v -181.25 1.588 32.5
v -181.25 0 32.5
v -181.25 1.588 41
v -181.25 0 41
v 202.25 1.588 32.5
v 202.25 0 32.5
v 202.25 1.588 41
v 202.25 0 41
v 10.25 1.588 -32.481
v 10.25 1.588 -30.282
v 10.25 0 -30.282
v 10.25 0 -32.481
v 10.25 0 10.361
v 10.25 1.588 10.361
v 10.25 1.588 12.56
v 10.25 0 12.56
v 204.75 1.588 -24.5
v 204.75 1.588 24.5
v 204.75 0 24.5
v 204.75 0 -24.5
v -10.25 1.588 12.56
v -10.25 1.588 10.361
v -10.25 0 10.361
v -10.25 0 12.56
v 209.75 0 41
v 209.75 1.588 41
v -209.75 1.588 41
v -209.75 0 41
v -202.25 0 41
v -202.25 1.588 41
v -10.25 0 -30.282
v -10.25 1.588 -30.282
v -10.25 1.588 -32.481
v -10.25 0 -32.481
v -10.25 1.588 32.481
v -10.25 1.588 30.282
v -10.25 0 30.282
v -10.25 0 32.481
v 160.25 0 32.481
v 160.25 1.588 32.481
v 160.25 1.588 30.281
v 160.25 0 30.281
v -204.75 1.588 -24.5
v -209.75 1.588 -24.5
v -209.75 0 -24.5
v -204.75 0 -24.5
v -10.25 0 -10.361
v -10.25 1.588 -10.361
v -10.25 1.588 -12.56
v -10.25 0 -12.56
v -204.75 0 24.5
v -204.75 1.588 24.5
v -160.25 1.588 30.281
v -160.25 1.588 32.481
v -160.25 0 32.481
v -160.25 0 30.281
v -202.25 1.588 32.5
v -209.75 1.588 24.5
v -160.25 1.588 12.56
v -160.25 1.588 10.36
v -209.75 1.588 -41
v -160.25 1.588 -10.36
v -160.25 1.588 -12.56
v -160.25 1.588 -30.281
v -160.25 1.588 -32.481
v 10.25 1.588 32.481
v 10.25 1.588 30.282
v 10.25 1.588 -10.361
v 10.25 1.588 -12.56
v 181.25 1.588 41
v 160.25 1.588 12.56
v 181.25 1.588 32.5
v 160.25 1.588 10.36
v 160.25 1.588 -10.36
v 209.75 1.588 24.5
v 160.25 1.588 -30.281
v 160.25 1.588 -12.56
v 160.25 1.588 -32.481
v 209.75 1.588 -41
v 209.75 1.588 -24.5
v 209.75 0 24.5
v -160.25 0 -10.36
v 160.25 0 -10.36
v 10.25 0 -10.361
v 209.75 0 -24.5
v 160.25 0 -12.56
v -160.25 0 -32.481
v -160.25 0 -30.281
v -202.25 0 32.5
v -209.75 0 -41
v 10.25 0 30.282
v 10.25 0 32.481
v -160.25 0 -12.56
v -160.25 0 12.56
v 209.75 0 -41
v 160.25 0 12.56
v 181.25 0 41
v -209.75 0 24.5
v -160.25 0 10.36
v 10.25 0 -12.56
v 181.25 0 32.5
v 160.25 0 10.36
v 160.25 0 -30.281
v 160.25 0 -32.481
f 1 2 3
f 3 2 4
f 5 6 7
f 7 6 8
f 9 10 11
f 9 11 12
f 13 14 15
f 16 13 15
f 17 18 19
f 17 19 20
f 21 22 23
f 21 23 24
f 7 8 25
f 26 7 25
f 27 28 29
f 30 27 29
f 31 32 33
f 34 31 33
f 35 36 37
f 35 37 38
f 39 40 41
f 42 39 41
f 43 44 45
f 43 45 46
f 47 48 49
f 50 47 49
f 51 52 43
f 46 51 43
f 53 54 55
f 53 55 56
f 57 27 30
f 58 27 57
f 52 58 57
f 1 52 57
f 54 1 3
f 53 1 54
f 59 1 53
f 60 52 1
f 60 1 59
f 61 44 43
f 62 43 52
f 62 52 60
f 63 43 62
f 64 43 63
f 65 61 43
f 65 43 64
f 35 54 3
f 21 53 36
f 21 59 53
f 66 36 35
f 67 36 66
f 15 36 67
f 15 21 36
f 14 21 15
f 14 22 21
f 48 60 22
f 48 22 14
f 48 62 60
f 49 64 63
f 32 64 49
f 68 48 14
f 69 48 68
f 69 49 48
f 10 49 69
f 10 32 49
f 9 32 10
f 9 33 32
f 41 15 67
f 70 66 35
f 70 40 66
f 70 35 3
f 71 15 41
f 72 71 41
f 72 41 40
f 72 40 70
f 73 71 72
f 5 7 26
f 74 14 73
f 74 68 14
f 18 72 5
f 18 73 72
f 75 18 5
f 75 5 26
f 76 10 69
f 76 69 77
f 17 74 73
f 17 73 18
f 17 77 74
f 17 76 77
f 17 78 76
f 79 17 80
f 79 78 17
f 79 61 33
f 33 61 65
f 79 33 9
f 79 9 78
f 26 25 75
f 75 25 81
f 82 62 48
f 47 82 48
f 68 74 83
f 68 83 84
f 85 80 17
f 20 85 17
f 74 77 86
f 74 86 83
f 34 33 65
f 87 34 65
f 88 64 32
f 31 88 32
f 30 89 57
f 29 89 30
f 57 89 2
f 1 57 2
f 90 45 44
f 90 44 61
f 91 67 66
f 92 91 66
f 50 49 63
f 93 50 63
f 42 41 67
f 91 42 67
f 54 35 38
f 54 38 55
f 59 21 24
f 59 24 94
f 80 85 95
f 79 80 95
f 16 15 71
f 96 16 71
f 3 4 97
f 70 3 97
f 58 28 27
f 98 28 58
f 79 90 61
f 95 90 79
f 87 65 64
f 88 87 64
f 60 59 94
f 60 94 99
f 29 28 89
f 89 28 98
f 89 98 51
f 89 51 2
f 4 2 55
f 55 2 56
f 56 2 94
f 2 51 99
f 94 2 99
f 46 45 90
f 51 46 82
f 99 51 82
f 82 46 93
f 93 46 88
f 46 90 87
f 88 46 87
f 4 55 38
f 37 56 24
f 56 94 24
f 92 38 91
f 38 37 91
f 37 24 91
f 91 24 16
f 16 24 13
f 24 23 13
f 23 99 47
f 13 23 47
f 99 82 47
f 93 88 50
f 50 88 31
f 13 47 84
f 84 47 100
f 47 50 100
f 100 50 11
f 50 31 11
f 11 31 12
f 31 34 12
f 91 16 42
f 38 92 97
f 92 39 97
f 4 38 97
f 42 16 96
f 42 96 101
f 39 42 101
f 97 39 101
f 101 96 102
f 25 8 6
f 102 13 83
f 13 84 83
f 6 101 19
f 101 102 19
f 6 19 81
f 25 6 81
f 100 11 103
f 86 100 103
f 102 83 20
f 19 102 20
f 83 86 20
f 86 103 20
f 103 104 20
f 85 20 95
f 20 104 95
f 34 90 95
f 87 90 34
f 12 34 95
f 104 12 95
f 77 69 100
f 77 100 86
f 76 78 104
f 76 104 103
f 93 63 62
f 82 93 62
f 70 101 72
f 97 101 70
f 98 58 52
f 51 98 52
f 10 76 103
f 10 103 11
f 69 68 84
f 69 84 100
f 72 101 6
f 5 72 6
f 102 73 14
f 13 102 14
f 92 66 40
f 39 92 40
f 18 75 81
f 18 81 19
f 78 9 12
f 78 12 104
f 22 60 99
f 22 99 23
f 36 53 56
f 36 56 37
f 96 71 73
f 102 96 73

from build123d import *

# Parameters (mm, degrees)
ESQUISSE1_W                = 419.5
ESQUISSE1_H                = 82
BOSS_EXTRU_1_DEPTH         = 1.5875
ESQUISSE2_W                = 5
ESQUISSE2_H                = 49
ENL_V_MAT_EXTRU_1_DEPTH    = 214.72548434
ENL_V_MAT_EXTRU_2_DEPTH    = 214.72548434
R_P_TITION_LIN_AIRE1_COUNT = 2
R_P_TITION_LIN_AIRE1_PITCH = 19.921
SYM_TRIE5_COPY_1_DEPTH     = 214.72548434
ENL_V_MAT_EXTRU_3_REACH    = 215.725
ESQUISSE5_W                = 21
ESQUISSE5_H                = 8.5
SYM_TRIE6_COPY_1_DEPTH     = 214.72548434
SYM_TRIE6_COPY_2_DEPTH     = 214.72548434
SYM_TRIE6_COPY_3_DEPTH     = 214.72548434


with BuildPart() as part:
    # Esquisse1 → Boss.-Extru.1 (new body)
    with BuildSketch(Plane(origin=(0, 0, 0), x_dir=(1, 0, 0), z_dir=(0, 1, 0))):
        Rectangle(ESQUISSE1_W, ESQUISSE1_H)
    extrude(amount=BOSS_EXTRU_1_DEPTH)

    # Esquisse2 → Enlèv. mat.-Extru.1 (cut, through all)
    with BuildSketch(Plane(origin=(0, 1.5875, 0), x_dir=(1, 0, 0), z_dir=(0, 1, 0))):
        with Locations((-207.25, 0)):
            Rectangle(ESQUISSE2_W, ESQUISSE2_H)
    enl_v_mat_extru_1 = extrude(amount=-ENL_V_MAT_EXTRU_1_DEPTH, mode=Mode.SUBTRACT)

    # Symétrie1: Enlèv. mat.-Extru.1 across plane
    add(enl_v_mat_extru_1.mirror(Plane(origin=(0, 0, 0), x_dir=(0, 0, 1), z_dir=(1, 0, 0))), mode=Mode.SUBTRACT)

    # Esquisse3 → Enlèv. mat.-Extru.2 (cut, through all)
    with BuildSketch(Plane(origin=(0, 1.5875, 0), x_dir=(1, 0, 0), z_dir=(0, 1, 0))):
        Polygon((10.25, 32.4815), (160.25, 32.481498288), (160.25, 30.281498288), (10.25, 30.2815), align=None)
    enl_v_mat_extru_2 = extrude(amount=-ENL_V_MAT_EXTRU_2_DEPTH, mode=Mode.SUBTRACT)

    # Répétition linéaire1: Enlèv. mat.-Extru.2 ×2
    with Locations(*[(0, 0, i * R_P_TITION_LIN_AIRE1_PITCH) for i in range(1, R_P_TITION_LIN_AIRE1_COUNT)]):
        add(enl_v_mat_extru_2, mode=Mode.SUBTRACT)

    # Symétrie5: Enlèv. mat.-Extru.2 across plane
    add(enl_v_mat_extru_2.mirror(Plane(origin=(0, 0, 0), x_dir=(0, 0, 1), z_dir=(1, 0, 0))), mode=Mode.SUBTRACT)

    # Symétrie5 copy 1 sketch → Symétrie5 copy 1 (cut, through all)
    with BuildSketch(Plane(origin=(0, 1.5875, 19.921), x_dir=(-1, 0, 0), z_dir=(0, 1, 0))):
        Polygon((10.25, -32.4815), (160.25, -32.481498288), (160.25, -30.281498288), (10.25, -30.2815), align=None)
    extrude(amount=-SYM_TRIE5_COPY_1_DEPTH, mode=Mode.SUBTRACT)

    # Esquisse5 → Enlèv. mat.-Extru.3 (cut, up to next)
    with BuildSketch(Plane.XZ, mode=Mode.PRIVATE) as enl_v_mat_extru_3_sk1:
        with Locations((191.75, 36.75)):
            Rectangle(ESQUISSE5_W, ESQUISSE5_H)
    enl_v_mat_extru_3_tool1 = extrude(enl_v_mat_extru_3_sk1.sketch, amount=-ENL_V_MAT_EXTRU_3_REACH, mode=Mode.PRIVATE) & part.part
    # Esquisse5 → Enlèv. mat.-Extru.3 (cut, up to next)
    with BuildSketch(Plane.XZ, mode=Mode.PRIVATE) as enl_v_mat_extru_3_sk2:
        with Locations((-191.75, 36.75)):
            Rectangle(ESQUISSE5_W, ESQUISSE5_H)
    enl_v_mat_extru_3_tool2 = extrude(enl_v_mat_extru_3_sk2.sketch, amount=-ENL_V_MAT_EXTRU_3_REACH, mode=Mode.PRIVATE) & part.part
    add(enl_v_mat_extru_3_tool1.solids().sort_by_distance((191.75, 0, 36.75))[0], mode=Mode.SUBTRACT)
    add(enl_v_mat_extru_3_tool2.solids().sort_by_distance((-191.75, 0, 36.75))[0], mode=Mode.SUBTRACT)

    # Symétrie6: Enlèv. mat.-Extru.2 across plane
    add(enl_v_mat_extru_2.mirror(Plane.XY), mode=Mode.SUBTRACT)

    # Symétrie6 copy 1 sketch → Symétrie6 copy 1 (cut, through all)
    with BuildSketch(Plane(origin=(0, 1.5875, -19.921), x_dir=(1, 0, 0), z_dir=(0, 1, 0))):
        Polygon((10.25, -32.4815), (160.25, -32.481498288), (160.25, -30.281498288), (10.25, -30.2815), align=None)
    extrude(amount=-SYM_TRIE6_COPY_1_DEPTH, mode=Mode.SUBTRACT)

    # Symétrie6 copy 2 sketch → Symétrie6 copy 2 (cut, through all)
    with BuildSketch(Plane(origin=(0, 1.5875, 0), x_dir=(-1, 0, 0), z_dir=(0, 1, 0))):
        Polygon((10.25, 32.4815), (160.25, 32.481498288), (160.25, 30.281498288), (10.25, 30.2815), align=None)
    extrude(amount=-SYM_TRIE6_COPY_2_DEPTH, mode=Mode.SUBTRACT)

    # Symétrie6 copy 3 sketch → Symétrie6 copy 3 (cut, through all)
    with BuildSketch(Plane(origin=(0, 1.5875, -19.921), x_dir=(-1, 0, 0), z_dir=(0, 1, 0))):
        Polygon((10.25, 32.4815), (160.25, 32.481498288), (160.25, 30.281498288), (10.25, 30.2815), align=None)
    extrude(amount=-SYM_TRIE6_COPY_3_DEPTH, mode=Mode.SUBTRACT)


solid = part.part
